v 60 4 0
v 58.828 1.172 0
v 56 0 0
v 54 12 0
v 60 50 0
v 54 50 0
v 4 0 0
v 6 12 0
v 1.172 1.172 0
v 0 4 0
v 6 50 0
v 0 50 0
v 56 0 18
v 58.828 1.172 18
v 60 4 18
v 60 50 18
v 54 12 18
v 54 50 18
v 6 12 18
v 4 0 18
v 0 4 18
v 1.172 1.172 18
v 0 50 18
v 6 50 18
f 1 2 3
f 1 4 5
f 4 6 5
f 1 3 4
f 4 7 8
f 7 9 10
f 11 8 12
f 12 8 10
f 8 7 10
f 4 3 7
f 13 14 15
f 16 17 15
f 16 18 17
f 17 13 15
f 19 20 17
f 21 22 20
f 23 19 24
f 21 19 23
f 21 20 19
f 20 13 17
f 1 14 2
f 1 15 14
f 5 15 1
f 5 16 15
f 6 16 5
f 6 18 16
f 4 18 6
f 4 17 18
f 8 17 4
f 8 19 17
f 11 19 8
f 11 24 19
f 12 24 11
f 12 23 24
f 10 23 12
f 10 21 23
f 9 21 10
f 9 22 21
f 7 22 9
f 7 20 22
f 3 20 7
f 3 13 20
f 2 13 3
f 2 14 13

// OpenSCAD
$fn = 32;

// ----------------------------------------------------------------------
// Heat sink frame: 60 x 50 mm frame, 6 mm walls
// ----------------------------------------------------------------------

// --- parameters (mm) ---
profile_height = 18;      // extrusion height
profile_points = 12;      // points of the closed outline

profile = [[0, 4], [1.172, 1.172], [4, 0], [56, 0], [58.828, 1.172], [60, 4], [60, 50], [54, 50], [54, 12], [6, 12], [6, 50], [0, 50]];  // single closed polygon, 12 points, counter clockwise

// --- the one profile operation ---
linear_extrude(height = profile_height) polygon(points = profile);
